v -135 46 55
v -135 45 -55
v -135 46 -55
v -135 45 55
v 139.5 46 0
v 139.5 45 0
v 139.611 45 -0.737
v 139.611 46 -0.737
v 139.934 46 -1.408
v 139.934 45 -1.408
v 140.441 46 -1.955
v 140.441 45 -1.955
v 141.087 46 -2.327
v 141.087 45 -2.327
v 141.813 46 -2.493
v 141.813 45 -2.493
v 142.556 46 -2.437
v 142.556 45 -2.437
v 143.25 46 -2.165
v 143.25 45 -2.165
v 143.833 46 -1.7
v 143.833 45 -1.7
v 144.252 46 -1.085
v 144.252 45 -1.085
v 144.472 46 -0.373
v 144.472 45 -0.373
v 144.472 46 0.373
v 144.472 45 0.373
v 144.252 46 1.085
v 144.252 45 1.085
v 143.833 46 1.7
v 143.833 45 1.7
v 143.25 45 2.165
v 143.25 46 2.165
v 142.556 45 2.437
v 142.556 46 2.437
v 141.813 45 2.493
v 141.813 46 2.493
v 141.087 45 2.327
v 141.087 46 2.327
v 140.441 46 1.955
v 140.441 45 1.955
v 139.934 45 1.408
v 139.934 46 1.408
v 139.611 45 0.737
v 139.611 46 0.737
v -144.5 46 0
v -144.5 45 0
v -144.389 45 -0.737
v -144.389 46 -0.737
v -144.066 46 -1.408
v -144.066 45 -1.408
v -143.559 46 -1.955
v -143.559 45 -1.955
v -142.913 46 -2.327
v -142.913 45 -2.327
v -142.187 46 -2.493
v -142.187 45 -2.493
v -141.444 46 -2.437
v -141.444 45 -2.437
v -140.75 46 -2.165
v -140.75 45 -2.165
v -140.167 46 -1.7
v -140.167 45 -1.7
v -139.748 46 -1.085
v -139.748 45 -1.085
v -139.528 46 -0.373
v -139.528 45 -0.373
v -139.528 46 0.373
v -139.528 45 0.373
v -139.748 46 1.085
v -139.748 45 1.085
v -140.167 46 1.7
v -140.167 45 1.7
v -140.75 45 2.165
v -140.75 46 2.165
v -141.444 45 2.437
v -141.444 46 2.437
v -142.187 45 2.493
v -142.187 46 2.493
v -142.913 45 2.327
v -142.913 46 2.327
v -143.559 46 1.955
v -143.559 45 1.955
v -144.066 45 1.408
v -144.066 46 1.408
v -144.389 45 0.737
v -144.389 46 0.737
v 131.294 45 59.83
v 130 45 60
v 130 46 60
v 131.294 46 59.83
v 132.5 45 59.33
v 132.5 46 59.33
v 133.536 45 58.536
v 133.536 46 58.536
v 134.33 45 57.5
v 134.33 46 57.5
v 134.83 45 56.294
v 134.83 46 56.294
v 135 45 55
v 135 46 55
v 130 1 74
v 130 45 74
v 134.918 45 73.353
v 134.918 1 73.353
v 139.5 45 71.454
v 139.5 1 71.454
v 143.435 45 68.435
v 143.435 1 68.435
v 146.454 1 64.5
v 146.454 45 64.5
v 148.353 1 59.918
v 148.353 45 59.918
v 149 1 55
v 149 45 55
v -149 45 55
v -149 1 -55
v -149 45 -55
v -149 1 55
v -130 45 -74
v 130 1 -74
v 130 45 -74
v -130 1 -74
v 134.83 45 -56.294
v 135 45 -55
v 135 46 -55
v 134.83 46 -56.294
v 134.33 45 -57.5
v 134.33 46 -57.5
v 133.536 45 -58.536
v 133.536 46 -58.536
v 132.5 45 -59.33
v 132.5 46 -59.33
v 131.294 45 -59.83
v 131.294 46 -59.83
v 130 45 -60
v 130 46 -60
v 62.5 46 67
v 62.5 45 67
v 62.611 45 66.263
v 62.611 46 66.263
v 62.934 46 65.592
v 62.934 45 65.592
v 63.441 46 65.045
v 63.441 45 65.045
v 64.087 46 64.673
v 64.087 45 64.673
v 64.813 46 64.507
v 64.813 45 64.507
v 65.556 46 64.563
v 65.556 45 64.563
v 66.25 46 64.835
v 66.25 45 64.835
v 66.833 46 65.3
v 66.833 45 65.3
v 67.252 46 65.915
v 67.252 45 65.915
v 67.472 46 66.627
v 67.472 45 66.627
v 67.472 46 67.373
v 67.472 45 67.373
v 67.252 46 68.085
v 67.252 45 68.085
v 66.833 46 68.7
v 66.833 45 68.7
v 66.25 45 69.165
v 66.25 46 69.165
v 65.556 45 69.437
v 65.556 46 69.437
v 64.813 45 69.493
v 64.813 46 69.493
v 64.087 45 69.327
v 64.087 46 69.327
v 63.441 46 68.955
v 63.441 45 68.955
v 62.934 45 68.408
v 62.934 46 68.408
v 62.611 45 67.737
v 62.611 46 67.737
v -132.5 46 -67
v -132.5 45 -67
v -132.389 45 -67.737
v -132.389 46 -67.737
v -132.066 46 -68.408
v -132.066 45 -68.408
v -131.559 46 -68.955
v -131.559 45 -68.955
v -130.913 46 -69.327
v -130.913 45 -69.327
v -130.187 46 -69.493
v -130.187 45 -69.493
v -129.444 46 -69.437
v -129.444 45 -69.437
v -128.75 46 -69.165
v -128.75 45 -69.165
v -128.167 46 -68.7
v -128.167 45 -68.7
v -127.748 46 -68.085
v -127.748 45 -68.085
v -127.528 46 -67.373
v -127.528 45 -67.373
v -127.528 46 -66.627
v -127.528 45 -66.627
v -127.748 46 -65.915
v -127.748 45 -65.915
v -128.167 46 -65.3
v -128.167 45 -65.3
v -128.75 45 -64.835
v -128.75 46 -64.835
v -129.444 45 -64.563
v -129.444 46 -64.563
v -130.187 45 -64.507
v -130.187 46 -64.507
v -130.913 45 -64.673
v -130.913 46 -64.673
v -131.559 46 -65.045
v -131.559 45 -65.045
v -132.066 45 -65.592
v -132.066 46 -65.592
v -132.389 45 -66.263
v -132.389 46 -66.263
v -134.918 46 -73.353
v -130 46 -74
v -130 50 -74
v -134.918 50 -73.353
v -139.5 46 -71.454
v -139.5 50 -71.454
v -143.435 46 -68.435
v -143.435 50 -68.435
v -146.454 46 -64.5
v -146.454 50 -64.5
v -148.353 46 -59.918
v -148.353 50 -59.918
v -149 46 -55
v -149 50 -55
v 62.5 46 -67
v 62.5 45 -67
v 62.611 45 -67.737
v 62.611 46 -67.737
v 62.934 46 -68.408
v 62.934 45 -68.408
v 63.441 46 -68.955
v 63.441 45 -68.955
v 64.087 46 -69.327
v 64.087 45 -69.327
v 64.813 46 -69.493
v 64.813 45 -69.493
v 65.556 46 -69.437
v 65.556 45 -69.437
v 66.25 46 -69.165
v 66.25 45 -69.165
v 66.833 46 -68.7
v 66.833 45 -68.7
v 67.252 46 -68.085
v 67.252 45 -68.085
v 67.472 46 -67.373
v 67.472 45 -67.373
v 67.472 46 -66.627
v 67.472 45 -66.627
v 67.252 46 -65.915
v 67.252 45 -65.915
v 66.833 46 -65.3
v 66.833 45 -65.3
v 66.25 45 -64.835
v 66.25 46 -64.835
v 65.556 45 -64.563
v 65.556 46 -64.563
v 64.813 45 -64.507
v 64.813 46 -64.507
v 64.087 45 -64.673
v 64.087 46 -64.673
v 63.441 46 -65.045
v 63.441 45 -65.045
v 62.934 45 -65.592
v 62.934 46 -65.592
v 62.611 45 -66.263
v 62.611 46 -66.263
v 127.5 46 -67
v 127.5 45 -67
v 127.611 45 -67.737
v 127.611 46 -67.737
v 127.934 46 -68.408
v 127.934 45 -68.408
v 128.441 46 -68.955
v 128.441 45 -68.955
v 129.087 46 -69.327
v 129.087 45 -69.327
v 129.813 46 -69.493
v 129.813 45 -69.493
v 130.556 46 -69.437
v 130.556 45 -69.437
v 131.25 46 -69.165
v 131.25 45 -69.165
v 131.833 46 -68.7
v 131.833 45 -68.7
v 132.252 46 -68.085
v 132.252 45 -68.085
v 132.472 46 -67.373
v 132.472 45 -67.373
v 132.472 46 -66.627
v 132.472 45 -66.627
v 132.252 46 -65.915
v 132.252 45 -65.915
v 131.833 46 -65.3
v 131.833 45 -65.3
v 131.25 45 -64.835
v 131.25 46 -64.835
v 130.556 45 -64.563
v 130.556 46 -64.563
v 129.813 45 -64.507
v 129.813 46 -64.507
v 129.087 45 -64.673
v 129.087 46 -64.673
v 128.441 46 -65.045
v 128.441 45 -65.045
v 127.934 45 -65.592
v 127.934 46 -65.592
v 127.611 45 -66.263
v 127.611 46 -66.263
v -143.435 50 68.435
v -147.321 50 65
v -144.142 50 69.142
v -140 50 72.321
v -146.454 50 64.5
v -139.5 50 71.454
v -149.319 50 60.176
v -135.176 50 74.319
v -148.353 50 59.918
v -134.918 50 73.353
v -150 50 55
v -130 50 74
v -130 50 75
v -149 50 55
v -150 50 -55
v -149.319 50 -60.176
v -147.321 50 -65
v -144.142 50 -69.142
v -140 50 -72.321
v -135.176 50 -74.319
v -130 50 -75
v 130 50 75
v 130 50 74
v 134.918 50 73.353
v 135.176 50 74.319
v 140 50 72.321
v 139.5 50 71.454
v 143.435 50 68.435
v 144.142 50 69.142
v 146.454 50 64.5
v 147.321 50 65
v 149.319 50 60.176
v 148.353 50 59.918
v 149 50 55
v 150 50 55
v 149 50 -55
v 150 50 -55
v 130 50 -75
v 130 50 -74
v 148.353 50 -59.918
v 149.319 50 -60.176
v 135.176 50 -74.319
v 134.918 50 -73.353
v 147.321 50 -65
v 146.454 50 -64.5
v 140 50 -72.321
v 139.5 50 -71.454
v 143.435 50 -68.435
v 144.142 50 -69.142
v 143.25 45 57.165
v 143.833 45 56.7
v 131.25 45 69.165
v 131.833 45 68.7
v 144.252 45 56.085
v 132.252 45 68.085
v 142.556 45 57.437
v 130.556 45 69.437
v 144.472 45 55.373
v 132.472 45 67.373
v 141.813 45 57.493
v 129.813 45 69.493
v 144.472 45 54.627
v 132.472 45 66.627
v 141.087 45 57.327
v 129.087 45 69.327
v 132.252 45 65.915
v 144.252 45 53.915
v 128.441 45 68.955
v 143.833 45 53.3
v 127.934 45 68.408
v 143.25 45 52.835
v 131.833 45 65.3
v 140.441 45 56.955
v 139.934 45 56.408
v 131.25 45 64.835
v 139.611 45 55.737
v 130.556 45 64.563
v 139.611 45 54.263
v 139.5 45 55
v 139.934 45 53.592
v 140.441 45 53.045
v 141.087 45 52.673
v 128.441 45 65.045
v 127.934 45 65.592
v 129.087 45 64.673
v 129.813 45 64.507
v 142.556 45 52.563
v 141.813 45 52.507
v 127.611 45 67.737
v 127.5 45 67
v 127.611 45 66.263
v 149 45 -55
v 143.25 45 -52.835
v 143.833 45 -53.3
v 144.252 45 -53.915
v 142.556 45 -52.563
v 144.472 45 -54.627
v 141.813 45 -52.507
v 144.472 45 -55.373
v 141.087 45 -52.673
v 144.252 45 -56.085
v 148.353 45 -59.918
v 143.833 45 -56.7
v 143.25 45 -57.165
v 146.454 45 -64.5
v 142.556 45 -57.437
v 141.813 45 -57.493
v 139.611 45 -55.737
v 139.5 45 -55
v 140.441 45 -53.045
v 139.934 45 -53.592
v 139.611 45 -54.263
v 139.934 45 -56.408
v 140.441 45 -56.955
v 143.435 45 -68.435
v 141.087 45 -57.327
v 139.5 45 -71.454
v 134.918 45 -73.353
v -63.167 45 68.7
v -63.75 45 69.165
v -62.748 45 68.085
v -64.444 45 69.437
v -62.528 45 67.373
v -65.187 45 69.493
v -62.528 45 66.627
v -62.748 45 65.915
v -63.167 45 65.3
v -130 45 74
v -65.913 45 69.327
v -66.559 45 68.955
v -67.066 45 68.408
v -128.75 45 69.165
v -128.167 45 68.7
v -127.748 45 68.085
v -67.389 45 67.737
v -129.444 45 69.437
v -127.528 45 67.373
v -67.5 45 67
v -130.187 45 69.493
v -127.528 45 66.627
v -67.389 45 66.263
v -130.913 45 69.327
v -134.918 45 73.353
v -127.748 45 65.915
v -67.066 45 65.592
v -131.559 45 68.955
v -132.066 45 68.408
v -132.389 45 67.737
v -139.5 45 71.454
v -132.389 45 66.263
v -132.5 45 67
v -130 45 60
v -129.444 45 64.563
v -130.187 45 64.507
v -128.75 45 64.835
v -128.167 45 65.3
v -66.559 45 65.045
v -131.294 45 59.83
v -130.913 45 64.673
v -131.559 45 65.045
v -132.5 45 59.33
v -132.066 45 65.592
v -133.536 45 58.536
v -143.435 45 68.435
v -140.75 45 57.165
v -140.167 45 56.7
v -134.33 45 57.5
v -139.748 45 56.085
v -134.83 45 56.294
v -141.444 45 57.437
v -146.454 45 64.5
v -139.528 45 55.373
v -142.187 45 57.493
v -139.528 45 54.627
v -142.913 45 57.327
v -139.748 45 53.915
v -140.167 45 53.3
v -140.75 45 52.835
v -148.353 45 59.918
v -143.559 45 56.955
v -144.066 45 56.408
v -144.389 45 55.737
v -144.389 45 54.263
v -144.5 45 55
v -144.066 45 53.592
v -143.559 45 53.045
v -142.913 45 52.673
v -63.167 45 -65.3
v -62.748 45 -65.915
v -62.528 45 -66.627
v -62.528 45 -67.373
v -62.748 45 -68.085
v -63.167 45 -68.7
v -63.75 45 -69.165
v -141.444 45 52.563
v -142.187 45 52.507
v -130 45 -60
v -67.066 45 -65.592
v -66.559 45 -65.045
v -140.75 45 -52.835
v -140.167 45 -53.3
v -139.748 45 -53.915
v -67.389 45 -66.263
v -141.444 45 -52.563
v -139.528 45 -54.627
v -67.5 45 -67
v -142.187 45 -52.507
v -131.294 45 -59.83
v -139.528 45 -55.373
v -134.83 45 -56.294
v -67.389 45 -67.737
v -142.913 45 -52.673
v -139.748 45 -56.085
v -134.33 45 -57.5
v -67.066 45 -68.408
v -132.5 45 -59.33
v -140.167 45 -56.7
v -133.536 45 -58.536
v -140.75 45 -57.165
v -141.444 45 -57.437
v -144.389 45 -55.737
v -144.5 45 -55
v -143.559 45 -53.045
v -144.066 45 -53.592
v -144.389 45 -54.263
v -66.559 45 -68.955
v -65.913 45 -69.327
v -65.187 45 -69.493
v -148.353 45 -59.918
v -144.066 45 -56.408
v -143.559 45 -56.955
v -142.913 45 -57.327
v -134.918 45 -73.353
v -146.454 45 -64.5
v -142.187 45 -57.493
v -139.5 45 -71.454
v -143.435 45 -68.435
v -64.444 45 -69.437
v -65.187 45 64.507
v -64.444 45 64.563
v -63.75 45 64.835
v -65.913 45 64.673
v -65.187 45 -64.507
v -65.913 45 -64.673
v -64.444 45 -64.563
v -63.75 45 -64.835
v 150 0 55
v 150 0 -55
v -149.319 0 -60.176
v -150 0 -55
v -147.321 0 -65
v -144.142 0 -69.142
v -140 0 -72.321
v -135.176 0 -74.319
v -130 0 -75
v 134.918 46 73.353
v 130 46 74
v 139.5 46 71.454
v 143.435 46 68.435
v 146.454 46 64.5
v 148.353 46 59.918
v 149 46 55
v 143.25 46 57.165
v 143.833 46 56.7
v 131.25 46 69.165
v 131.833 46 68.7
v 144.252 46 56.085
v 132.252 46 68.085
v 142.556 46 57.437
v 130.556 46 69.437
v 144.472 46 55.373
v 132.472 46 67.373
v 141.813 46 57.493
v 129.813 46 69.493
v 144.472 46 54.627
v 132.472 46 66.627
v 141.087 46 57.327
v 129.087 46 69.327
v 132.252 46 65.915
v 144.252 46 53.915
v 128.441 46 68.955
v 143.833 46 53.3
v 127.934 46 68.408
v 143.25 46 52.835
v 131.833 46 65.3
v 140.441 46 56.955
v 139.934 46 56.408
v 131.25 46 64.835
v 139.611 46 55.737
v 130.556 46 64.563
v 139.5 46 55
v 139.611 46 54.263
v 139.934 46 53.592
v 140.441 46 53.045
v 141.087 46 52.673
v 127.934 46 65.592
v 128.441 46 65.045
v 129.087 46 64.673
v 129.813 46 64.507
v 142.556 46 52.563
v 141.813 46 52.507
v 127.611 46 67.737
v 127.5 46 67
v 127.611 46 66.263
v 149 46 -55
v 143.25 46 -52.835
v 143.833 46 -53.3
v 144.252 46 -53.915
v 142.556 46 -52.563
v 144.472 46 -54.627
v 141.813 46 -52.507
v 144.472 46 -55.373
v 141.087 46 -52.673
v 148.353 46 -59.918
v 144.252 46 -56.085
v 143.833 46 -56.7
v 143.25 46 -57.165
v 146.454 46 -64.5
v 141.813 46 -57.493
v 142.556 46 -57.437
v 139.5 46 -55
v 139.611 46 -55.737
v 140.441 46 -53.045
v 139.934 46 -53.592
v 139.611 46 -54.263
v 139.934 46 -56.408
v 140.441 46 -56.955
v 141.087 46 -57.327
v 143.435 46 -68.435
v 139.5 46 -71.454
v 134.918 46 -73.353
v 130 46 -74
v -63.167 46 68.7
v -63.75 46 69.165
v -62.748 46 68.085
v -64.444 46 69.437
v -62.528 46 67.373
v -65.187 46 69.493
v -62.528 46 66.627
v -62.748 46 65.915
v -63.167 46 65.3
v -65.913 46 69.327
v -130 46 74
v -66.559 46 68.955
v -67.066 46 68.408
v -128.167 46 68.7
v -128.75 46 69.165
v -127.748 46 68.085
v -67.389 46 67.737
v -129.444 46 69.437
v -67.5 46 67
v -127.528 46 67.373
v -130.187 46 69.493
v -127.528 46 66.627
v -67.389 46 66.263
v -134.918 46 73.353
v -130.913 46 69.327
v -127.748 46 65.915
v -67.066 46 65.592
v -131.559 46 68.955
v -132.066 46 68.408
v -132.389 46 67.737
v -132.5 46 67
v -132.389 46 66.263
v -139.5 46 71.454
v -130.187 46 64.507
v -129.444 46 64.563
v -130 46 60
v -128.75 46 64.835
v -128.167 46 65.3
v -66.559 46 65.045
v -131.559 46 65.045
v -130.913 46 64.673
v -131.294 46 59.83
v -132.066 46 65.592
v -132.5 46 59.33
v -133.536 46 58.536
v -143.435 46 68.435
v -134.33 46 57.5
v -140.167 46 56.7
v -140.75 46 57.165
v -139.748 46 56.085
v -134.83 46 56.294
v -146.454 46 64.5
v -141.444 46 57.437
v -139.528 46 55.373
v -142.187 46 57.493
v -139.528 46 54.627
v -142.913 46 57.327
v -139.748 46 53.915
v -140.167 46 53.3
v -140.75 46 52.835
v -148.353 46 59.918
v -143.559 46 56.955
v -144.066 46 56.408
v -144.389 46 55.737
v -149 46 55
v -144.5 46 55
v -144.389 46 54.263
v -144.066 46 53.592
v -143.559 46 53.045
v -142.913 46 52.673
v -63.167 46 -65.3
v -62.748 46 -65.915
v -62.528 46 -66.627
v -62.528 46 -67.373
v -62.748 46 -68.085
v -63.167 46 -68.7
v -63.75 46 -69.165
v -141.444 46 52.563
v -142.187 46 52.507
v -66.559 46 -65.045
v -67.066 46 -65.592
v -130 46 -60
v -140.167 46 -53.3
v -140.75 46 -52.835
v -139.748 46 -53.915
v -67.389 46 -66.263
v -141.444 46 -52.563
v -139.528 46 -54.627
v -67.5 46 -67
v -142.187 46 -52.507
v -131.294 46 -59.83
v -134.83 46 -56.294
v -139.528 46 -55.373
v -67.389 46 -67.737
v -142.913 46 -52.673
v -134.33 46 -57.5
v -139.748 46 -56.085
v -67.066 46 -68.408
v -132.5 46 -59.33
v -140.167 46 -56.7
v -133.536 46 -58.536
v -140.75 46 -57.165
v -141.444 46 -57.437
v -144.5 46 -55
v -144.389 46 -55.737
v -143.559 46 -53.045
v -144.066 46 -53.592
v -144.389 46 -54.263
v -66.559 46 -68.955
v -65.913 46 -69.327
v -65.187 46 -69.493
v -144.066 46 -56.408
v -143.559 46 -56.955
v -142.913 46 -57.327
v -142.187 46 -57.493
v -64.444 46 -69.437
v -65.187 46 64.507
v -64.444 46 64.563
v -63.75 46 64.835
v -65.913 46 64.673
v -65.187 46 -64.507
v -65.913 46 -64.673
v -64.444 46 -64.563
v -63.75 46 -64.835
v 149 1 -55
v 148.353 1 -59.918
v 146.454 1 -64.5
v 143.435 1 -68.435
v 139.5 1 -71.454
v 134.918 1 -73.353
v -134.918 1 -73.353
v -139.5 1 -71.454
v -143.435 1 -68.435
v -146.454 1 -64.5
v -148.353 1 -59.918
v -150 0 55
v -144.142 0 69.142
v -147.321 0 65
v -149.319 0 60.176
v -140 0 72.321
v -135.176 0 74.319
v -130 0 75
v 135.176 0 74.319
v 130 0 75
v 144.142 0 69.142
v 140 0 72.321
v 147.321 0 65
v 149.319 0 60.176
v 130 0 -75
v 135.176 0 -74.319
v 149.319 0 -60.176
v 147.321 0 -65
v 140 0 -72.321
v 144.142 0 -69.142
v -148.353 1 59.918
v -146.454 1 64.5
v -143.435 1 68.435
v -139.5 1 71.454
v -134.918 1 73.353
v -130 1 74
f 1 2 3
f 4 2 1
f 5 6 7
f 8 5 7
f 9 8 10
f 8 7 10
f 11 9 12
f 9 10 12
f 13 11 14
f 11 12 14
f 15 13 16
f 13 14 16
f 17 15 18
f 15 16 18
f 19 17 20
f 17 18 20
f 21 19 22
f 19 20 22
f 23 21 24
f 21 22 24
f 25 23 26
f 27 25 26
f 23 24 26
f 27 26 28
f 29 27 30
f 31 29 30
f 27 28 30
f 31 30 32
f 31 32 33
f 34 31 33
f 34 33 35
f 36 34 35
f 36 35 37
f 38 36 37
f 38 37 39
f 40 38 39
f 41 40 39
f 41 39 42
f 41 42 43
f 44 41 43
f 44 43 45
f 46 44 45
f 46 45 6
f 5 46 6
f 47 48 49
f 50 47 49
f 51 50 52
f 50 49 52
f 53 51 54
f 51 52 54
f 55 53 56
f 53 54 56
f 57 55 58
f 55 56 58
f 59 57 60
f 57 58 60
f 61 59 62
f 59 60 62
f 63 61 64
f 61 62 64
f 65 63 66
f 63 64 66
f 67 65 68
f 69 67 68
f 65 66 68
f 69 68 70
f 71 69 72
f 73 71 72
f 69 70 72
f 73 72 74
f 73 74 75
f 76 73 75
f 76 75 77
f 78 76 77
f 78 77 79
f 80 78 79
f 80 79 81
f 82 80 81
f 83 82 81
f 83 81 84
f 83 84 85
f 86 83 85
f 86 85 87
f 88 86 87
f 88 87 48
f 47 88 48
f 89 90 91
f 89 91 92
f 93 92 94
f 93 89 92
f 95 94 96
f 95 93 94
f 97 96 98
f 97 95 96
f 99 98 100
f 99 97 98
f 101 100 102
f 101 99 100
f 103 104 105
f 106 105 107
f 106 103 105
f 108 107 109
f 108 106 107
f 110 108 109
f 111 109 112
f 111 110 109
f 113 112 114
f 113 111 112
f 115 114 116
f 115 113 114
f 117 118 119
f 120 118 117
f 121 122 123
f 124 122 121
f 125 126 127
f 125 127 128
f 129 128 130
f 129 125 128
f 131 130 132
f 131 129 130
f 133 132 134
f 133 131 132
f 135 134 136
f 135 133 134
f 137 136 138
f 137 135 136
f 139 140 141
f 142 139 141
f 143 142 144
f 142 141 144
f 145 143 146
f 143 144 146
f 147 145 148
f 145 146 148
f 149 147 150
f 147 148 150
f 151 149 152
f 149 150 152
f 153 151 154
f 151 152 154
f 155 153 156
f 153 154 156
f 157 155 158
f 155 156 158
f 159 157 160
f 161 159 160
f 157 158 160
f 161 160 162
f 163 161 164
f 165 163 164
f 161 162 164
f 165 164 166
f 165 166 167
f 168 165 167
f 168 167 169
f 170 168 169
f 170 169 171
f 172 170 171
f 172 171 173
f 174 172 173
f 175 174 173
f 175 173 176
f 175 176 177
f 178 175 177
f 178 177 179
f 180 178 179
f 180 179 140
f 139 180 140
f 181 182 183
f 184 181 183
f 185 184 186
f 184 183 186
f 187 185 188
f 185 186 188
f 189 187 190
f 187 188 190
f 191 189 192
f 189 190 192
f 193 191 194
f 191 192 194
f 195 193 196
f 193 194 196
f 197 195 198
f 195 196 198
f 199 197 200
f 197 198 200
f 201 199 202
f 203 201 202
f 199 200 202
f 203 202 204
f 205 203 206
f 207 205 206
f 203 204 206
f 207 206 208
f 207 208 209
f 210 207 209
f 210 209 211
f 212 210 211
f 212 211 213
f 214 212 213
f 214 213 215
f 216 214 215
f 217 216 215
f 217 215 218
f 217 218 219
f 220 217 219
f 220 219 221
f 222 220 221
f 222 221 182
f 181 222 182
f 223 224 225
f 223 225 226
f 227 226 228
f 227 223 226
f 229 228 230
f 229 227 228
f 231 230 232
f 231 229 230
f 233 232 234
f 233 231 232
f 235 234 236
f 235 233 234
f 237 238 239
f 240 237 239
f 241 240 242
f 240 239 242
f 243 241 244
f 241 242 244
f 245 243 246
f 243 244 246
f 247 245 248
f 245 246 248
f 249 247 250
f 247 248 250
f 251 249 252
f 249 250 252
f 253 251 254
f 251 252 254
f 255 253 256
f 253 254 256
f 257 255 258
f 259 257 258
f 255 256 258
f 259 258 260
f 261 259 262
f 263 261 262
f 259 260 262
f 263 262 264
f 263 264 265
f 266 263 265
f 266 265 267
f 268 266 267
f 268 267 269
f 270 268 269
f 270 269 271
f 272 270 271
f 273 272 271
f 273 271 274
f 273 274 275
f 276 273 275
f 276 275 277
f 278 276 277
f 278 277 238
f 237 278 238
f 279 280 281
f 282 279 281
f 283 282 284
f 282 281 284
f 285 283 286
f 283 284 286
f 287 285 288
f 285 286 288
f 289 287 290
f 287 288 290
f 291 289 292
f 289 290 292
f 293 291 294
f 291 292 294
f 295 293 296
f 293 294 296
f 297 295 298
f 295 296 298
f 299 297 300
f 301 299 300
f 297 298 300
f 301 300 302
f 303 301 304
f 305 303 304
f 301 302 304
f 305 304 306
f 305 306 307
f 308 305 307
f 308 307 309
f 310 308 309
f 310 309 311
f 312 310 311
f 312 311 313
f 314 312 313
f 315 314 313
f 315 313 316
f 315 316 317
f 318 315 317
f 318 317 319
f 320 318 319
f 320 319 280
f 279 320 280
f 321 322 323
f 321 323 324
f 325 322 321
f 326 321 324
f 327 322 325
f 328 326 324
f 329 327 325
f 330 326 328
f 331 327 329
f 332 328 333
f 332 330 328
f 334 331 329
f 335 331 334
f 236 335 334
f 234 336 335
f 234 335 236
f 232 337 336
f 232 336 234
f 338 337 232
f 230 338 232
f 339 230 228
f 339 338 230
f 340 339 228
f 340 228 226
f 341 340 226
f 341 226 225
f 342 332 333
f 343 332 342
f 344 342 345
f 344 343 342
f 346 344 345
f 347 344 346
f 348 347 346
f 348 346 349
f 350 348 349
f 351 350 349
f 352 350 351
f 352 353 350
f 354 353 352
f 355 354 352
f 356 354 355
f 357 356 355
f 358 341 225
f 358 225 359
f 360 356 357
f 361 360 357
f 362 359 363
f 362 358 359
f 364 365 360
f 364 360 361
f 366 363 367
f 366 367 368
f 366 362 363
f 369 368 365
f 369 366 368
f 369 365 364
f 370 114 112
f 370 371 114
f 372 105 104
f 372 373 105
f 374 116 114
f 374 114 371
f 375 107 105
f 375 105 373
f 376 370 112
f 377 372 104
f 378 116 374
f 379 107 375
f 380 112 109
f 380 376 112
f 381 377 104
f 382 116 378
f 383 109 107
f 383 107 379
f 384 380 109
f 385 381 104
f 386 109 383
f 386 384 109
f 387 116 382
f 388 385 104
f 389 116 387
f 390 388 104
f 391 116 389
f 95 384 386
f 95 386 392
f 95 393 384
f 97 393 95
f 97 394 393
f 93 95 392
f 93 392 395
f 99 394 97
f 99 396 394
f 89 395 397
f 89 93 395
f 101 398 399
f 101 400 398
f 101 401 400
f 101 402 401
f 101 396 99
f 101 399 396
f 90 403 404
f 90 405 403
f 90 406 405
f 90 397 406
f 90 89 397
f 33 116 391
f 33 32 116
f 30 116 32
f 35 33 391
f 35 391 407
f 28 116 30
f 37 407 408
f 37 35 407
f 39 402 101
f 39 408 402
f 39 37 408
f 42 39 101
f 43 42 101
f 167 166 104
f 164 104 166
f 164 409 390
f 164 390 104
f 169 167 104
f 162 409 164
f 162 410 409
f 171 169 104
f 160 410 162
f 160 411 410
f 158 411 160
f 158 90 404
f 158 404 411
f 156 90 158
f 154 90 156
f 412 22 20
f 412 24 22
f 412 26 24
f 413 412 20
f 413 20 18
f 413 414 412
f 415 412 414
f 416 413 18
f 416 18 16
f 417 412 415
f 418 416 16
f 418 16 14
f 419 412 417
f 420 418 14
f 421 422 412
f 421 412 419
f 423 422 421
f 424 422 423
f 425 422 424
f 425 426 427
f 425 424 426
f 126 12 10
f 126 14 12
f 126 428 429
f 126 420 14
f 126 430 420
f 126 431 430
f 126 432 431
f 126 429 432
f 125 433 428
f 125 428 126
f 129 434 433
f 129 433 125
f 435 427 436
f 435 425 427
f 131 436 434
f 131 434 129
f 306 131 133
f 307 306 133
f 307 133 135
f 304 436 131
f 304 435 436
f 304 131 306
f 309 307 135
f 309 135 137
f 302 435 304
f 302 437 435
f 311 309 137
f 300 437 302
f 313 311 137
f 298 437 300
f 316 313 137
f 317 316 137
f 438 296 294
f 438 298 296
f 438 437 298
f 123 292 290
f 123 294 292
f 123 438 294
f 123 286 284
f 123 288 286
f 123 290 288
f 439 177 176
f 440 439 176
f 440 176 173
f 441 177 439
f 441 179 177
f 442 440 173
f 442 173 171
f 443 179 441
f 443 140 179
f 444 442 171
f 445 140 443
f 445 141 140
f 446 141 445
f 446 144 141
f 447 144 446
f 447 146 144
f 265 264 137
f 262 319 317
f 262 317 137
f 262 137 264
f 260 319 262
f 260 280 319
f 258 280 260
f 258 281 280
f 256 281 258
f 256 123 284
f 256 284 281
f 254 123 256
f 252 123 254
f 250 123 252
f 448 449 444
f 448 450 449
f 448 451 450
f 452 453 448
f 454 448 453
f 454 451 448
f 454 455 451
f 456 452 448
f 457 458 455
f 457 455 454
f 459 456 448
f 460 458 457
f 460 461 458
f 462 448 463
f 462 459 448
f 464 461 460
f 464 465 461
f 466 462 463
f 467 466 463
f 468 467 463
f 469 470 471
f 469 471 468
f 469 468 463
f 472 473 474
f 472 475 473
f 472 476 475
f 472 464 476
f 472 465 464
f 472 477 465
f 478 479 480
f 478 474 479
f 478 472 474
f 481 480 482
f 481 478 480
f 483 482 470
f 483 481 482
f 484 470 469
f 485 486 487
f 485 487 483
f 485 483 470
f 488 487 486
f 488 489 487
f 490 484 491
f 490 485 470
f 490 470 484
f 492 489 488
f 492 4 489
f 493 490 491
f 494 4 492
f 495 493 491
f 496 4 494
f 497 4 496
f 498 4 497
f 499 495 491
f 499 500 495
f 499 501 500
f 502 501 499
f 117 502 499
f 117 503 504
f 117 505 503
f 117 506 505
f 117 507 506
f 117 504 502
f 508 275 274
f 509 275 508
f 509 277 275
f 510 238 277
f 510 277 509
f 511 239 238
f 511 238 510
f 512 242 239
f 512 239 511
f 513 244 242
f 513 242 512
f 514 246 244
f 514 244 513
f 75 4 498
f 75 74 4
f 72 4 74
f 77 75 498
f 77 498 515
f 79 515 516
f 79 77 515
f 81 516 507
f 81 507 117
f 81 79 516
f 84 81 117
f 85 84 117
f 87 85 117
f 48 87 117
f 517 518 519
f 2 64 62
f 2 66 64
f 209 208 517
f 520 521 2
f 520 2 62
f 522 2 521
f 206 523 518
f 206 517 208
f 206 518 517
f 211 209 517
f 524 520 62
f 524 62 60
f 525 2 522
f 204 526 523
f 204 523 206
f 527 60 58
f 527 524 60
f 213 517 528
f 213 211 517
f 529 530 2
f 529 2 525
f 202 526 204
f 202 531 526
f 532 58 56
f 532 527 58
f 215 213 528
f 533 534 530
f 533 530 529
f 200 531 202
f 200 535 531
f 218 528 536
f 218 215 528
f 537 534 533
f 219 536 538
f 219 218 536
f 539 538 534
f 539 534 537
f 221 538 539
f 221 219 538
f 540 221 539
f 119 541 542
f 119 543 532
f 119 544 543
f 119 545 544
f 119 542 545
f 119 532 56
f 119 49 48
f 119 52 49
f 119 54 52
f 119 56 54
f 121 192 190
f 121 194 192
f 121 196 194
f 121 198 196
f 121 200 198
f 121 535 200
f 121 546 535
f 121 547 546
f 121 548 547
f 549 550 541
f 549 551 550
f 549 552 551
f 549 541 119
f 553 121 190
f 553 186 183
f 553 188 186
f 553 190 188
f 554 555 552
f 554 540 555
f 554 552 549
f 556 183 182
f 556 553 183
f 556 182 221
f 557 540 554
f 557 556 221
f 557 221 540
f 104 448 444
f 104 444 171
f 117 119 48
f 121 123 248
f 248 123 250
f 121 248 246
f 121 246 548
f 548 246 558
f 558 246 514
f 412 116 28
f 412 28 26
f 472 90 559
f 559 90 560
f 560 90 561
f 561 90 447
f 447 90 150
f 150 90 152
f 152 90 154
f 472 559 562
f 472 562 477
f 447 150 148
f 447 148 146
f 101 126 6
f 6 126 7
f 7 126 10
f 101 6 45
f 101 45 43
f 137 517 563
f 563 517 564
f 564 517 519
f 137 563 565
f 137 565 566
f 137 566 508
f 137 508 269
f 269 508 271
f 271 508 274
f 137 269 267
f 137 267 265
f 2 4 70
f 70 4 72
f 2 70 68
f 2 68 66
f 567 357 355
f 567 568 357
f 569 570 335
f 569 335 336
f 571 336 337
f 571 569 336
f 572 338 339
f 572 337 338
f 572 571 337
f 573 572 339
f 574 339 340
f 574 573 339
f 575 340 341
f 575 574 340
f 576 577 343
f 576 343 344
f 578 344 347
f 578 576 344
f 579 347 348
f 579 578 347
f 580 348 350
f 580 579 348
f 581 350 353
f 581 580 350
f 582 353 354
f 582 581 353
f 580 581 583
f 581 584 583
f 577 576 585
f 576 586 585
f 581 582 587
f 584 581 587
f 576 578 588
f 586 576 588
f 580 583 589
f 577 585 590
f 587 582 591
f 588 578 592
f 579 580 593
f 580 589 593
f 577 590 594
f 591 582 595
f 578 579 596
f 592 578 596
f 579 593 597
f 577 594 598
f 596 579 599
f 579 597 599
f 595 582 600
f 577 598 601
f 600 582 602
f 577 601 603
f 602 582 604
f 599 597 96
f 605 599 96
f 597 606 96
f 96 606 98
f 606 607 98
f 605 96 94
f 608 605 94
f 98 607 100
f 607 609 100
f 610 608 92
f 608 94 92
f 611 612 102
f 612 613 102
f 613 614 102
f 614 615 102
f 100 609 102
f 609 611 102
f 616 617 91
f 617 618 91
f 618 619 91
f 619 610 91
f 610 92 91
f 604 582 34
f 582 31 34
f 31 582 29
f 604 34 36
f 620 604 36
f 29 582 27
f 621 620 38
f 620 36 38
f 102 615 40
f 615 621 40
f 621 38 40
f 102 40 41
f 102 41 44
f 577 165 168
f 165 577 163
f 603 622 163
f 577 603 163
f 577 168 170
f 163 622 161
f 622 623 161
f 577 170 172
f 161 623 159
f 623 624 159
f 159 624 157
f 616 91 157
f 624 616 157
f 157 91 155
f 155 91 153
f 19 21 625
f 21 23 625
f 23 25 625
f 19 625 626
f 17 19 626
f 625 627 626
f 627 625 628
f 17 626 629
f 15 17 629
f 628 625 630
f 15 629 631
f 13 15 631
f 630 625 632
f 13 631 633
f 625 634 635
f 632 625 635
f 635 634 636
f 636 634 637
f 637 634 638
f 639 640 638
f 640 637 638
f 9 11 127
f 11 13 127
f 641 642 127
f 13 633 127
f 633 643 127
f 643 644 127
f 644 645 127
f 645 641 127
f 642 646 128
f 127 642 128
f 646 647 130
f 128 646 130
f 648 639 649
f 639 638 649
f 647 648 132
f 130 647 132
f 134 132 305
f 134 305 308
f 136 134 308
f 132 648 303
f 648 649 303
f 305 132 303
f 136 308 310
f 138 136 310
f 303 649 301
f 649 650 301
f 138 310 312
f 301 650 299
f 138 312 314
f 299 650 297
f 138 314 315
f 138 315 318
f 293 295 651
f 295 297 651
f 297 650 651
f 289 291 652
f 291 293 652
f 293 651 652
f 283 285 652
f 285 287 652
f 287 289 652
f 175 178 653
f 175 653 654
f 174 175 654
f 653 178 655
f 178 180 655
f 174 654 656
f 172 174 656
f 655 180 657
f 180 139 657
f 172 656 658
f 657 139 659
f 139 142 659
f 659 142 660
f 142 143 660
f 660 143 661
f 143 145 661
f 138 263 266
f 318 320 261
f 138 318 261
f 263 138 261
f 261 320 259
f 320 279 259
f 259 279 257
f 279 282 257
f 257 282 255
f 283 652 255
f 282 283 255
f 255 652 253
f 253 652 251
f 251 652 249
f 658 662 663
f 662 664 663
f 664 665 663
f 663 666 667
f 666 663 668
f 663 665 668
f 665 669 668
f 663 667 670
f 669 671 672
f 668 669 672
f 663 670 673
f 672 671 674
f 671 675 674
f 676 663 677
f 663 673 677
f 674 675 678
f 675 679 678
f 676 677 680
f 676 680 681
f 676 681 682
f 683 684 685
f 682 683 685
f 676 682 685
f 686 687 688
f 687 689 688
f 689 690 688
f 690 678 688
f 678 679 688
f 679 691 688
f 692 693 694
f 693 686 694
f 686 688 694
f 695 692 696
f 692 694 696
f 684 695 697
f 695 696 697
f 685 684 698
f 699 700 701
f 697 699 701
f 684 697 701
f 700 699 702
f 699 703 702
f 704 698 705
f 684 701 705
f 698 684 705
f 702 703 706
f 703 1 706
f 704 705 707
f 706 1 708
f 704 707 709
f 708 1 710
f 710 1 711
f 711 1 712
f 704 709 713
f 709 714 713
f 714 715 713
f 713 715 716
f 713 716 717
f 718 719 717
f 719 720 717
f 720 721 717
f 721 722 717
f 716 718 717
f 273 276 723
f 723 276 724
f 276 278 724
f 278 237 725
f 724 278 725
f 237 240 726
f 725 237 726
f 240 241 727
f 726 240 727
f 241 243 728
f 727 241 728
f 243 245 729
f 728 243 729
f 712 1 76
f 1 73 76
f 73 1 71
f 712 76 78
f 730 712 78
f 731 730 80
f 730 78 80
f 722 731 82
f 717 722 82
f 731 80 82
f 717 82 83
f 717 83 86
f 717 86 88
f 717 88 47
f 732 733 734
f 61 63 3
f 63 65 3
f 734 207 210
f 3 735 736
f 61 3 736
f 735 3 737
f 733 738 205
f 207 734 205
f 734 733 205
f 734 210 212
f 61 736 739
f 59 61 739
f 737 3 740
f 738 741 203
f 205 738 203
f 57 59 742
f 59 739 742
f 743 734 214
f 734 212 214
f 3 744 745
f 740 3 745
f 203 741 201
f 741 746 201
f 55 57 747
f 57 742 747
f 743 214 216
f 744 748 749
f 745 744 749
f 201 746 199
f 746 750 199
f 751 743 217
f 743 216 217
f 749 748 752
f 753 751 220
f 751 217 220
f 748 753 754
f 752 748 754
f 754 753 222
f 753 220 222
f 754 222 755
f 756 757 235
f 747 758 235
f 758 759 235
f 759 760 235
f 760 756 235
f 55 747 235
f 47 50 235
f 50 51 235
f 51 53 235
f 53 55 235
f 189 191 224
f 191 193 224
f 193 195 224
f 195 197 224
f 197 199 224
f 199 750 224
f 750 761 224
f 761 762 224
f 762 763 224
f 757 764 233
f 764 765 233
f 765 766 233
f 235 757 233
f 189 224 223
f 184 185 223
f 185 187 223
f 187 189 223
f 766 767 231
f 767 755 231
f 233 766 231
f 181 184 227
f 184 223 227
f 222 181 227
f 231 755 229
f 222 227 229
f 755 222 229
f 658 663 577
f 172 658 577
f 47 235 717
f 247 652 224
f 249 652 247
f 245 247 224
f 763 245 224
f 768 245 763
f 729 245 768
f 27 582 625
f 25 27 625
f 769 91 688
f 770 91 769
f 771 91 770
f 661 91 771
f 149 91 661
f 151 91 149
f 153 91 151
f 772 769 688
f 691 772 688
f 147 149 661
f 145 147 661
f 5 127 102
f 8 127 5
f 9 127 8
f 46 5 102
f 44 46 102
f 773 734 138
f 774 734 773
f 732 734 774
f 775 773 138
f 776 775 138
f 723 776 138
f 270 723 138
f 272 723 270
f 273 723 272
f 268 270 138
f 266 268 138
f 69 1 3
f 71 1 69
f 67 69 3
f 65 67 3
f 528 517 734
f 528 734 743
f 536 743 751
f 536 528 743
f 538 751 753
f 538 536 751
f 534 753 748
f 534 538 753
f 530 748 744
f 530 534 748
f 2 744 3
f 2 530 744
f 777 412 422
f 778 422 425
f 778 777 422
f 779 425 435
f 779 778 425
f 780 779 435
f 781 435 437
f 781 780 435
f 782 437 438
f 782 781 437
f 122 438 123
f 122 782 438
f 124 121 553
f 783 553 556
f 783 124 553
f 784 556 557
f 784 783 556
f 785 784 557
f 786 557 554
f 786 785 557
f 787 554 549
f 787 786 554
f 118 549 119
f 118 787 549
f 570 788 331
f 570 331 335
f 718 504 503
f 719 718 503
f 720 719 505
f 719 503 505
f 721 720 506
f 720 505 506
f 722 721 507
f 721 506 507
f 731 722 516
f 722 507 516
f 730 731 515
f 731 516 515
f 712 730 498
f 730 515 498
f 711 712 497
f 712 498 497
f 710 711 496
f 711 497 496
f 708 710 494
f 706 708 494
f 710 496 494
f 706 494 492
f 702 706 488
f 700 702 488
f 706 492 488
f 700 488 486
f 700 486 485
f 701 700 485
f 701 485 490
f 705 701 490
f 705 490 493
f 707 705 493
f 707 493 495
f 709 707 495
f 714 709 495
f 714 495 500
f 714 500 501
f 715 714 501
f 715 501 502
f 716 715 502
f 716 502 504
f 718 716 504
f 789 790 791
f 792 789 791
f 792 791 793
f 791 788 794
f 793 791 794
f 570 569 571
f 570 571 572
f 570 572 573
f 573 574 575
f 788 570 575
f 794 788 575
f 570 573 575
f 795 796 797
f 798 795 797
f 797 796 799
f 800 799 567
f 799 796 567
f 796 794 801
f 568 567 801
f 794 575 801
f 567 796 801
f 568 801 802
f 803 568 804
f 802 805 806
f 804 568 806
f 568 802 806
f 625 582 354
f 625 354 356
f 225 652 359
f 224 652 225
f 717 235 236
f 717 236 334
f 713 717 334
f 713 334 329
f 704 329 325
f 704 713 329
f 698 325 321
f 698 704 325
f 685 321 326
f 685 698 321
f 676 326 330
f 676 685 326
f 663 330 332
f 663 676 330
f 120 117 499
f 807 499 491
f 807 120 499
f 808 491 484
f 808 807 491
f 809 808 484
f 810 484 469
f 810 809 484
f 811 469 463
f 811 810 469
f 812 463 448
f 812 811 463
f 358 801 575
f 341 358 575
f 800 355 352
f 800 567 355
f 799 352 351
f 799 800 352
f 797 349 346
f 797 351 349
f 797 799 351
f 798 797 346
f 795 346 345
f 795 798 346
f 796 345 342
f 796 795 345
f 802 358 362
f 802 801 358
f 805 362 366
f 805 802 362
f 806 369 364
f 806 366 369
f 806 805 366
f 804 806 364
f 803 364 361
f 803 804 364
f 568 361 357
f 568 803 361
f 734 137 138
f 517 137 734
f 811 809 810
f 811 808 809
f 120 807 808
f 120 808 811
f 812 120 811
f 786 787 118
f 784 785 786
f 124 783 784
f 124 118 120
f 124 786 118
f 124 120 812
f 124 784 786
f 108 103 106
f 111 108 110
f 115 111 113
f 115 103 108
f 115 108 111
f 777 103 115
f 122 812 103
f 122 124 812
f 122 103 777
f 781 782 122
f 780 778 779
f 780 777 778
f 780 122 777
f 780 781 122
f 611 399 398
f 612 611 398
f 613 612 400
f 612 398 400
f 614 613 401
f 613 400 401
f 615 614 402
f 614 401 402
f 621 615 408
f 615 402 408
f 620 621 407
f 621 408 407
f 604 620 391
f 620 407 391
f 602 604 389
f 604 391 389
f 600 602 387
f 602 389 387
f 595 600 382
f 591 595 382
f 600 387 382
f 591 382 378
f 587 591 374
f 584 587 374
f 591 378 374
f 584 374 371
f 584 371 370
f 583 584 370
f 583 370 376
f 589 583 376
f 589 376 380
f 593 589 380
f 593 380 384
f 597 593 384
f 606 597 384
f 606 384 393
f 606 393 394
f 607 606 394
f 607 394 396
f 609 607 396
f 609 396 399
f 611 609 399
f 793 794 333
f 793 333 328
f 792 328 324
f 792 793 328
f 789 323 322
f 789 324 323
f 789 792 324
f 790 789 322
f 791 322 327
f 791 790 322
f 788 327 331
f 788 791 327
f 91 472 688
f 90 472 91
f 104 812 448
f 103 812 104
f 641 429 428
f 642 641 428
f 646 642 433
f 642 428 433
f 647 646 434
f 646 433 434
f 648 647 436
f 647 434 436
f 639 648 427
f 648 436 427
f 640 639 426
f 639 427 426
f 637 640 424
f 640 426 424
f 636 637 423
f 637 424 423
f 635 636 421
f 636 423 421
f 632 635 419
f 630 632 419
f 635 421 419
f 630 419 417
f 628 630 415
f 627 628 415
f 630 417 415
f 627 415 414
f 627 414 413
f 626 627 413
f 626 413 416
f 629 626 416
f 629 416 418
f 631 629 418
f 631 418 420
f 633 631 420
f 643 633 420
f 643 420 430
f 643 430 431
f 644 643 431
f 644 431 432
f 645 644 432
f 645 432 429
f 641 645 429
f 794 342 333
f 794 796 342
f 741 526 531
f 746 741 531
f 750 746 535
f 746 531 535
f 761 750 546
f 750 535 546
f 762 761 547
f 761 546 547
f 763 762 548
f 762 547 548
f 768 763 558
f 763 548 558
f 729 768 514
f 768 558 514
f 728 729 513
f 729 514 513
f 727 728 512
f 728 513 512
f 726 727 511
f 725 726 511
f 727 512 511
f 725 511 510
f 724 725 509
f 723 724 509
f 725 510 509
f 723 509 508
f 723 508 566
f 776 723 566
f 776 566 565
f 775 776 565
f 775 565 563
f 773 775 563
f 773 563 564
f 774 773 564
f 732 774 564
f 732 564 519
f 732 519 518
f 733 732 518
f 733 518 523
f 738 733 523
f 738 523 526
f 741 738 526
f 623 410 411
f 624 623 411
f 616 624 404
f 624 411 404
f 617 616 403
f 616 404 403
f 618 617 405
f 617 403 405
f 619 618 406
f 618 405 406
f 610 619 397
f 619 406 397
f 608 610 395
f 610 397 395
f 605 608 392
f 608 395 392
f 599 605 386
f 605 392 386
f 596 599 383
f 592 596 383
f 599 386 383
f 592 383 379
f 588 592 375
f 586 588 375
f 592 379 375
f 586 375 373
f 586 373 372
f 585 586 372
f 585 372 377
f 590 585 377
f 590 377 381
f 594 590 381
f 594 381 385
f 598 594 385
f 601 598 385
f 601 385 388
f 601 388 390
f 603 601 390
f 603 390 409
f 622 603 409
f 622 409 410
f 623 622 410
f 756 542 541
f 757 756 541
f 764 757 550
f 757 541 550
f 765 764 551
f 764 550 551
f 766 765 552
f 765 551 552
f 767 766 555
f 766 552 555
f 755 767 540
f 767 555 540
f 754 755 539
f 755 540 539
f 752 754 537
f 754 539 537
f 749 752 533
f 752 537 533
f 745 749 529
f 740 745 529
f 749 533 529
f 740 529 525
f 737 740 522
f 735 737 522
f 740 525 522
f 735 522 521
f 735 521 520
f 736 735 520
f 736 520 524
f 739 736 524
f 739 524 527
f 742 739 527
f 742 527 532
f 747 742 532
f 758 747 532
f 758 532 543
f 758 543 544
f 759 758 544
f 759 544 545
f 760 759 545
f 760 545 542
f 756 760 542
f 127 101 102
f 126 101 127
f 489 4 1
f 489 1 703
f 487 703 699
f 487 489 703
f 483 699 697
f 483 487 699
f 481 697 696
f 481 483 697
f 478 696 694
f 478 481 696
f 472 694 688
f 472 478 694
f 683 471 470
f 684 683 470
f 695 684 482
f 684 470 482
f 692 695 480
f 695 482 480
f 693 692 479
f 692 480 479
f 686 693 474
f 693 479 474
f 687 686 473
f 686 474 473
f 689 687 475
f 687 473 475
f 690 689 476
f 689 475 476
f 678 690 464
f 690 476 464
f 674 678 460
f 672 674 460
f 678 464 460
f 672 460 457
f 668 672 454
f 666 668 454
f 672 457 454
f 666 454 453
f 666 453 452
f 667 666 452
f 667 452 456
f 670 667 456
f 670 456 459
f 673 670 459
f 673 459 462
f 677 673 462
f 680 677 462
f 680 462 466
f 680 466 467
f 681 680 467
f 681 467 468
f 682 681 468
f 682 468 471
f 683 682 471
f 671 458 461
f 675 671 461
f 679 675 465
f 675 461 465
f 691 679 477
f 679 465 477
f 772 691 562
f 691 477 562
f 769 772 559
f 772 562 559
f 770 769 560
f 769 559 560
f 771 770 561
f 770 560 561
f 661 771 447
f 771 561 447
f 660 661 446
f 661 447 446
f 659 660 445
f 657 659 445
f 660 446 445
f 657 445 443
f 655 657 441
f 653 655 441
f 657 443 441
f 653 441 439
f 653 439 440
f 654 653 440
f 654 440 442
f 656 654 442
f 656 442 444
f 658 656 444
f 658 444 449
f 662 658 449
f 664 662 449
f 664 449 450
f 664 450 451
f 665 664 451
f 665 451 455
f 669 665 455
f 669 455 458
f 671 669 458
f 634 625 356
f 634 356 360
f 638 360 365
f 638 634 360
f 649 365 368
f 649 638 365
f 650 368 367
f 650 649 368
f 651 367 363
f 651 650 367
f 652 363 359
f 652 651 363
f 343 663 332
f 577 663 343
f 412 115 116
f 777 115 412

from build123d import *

# Parameters (mm, degrees)
BOSS_EXTRUDE1_DEPTH       = 50
SHELL1_T                  = -1
BOSS_EXTRUDE3_START       = 5
BOSS_EXTRUDE3_DEPTH       = 1
F_5_0MM_DOWEL_HOLE2_D     = 5
F_5_0MM_DOWEL_HOLE2_DEPTH = 1
F_5_0MM_DOWEL_HOLE3_D     = 5
F_5_0MM_DOWEL_HOLE3_DEPTH = 1


with BuildPart() as part:
    # Sketch1 → Boss-Extrude1 (new body)
    with BuildSketch(Plane(origin=(0, 0, 0), x_dir=(1, 0, 0), z_dir=(0, 1, 0))):
        with BuildLine():
            Line((-130, -75), (130, -75))
            ThreePointArc((130, -75), (144.142135624, -69.142135624), (150, -55))
            Line((150, -55), (150, 55))
            ThreePointArc((150, 55), (144.142135624, 69.142135624), (130, 75))
            Line((130, 75), (-130, 75))
            ThreePointArc((-130, 75), (-144.142135624, 69.142135624), (-150, 55))
            Line((-150, 55), (-150, -55))
            ThreePointArc((-150, -55), (-144.142135624, -69.142135624), (-130, -75))
        make_face()
    extrude(amount=BOSS_EXTRUDE1_DEPTH)

    # Shell1
    shell1_openings = [part.faces().sort_by_distance(p)[0] for p in [
        (0, 50, 0),
    ]]
    offset(amount=SHELL1_T, openings=shell1_openings, kind=Kind.INTERSECTION)

    # Sketch3 → Boss-Extrude3 (add)
    with BuildSketch(Plane(origin=(0, 50, 0), x_dir=(-1, 0, 0), z_dir=(0, -1, 0)).offset(BOSS_EXTRUDE3_START)):
        with BuildLine():
            Line((130, 75), (-130, 75))
            ThreePointArc((-130, 75), (-144.142135624, 69.142135624), (-150, 55))
            Line((-150, 55), (-150, -55))
            ThreePointArc((-150, -55), (-144.142135624, -69.142135624), (-130, -75))
            Line((-130, -75), (130, -75))
            ThreePointArc((130, -75), (144.142135624, -69.142135624), (150, -55))
            Line((150, -55), (150, 55))
            ThreePointArc((150, 55), (144.142135624, 69.142135624), (130, 75))
        make_face()
        with BuildLine():
            Line((130, -60), (-130, -60))
            ThreePointArc((-130, -60), (-133.535533906, -58.535533906), (-135, -55))
            Line((-135, -55), (-135, 55))
            ThreePointArc((-135, 55), (-133.535533906, 58.535533906), (-130, 60))
            Line((-130, 60), (130, 60))
            ThreePointArc((130, 60), (133.535533906, 58.535533906), (135, 55))
            Line((135, 55), (135, -55))
            ThreePointArc((135, -55), (133.535533906, -58.535533906), (130, -60))
        make_face(mode=Mode.SUBTRACT)
    extrude(amount=-BOSS_EXTRUDE3_DEPTH)

    # Ø5.0mm Dowel Hole2
    with Locations(Plane(origin=(0, 46, 0), x_dir=(1, 0, 0), z_dir=(0, 1, 0))):
        with Locations((-65, 67), (65, 67), (142, 0), (-142, 0), (-65, -67), (65, -67)):
            Hole(F_5_0MM_DOWEL_HOLE2_D / 2, depth=F_5_0MM_DOWEL_HOLE2_DEPTH)

    # Ø5.0mm Dowel Hole3
    with Locations(Plane(origin=(0, 46, 0), x_dir=(1, 0, 0), z_dir=(0, 1, 0))):
        with Locations((-130, 67), (-142, 55), (-142, -55), (-130, -67), (130, -67), (142, -55), (142, 55), (130, 67)):
            Hole(F_5_0MM_DOWEL_HOLE3_D / 2, depth=F_5_0MM_DOWEL_HOLE3_DEPTH)


solid = part.part
